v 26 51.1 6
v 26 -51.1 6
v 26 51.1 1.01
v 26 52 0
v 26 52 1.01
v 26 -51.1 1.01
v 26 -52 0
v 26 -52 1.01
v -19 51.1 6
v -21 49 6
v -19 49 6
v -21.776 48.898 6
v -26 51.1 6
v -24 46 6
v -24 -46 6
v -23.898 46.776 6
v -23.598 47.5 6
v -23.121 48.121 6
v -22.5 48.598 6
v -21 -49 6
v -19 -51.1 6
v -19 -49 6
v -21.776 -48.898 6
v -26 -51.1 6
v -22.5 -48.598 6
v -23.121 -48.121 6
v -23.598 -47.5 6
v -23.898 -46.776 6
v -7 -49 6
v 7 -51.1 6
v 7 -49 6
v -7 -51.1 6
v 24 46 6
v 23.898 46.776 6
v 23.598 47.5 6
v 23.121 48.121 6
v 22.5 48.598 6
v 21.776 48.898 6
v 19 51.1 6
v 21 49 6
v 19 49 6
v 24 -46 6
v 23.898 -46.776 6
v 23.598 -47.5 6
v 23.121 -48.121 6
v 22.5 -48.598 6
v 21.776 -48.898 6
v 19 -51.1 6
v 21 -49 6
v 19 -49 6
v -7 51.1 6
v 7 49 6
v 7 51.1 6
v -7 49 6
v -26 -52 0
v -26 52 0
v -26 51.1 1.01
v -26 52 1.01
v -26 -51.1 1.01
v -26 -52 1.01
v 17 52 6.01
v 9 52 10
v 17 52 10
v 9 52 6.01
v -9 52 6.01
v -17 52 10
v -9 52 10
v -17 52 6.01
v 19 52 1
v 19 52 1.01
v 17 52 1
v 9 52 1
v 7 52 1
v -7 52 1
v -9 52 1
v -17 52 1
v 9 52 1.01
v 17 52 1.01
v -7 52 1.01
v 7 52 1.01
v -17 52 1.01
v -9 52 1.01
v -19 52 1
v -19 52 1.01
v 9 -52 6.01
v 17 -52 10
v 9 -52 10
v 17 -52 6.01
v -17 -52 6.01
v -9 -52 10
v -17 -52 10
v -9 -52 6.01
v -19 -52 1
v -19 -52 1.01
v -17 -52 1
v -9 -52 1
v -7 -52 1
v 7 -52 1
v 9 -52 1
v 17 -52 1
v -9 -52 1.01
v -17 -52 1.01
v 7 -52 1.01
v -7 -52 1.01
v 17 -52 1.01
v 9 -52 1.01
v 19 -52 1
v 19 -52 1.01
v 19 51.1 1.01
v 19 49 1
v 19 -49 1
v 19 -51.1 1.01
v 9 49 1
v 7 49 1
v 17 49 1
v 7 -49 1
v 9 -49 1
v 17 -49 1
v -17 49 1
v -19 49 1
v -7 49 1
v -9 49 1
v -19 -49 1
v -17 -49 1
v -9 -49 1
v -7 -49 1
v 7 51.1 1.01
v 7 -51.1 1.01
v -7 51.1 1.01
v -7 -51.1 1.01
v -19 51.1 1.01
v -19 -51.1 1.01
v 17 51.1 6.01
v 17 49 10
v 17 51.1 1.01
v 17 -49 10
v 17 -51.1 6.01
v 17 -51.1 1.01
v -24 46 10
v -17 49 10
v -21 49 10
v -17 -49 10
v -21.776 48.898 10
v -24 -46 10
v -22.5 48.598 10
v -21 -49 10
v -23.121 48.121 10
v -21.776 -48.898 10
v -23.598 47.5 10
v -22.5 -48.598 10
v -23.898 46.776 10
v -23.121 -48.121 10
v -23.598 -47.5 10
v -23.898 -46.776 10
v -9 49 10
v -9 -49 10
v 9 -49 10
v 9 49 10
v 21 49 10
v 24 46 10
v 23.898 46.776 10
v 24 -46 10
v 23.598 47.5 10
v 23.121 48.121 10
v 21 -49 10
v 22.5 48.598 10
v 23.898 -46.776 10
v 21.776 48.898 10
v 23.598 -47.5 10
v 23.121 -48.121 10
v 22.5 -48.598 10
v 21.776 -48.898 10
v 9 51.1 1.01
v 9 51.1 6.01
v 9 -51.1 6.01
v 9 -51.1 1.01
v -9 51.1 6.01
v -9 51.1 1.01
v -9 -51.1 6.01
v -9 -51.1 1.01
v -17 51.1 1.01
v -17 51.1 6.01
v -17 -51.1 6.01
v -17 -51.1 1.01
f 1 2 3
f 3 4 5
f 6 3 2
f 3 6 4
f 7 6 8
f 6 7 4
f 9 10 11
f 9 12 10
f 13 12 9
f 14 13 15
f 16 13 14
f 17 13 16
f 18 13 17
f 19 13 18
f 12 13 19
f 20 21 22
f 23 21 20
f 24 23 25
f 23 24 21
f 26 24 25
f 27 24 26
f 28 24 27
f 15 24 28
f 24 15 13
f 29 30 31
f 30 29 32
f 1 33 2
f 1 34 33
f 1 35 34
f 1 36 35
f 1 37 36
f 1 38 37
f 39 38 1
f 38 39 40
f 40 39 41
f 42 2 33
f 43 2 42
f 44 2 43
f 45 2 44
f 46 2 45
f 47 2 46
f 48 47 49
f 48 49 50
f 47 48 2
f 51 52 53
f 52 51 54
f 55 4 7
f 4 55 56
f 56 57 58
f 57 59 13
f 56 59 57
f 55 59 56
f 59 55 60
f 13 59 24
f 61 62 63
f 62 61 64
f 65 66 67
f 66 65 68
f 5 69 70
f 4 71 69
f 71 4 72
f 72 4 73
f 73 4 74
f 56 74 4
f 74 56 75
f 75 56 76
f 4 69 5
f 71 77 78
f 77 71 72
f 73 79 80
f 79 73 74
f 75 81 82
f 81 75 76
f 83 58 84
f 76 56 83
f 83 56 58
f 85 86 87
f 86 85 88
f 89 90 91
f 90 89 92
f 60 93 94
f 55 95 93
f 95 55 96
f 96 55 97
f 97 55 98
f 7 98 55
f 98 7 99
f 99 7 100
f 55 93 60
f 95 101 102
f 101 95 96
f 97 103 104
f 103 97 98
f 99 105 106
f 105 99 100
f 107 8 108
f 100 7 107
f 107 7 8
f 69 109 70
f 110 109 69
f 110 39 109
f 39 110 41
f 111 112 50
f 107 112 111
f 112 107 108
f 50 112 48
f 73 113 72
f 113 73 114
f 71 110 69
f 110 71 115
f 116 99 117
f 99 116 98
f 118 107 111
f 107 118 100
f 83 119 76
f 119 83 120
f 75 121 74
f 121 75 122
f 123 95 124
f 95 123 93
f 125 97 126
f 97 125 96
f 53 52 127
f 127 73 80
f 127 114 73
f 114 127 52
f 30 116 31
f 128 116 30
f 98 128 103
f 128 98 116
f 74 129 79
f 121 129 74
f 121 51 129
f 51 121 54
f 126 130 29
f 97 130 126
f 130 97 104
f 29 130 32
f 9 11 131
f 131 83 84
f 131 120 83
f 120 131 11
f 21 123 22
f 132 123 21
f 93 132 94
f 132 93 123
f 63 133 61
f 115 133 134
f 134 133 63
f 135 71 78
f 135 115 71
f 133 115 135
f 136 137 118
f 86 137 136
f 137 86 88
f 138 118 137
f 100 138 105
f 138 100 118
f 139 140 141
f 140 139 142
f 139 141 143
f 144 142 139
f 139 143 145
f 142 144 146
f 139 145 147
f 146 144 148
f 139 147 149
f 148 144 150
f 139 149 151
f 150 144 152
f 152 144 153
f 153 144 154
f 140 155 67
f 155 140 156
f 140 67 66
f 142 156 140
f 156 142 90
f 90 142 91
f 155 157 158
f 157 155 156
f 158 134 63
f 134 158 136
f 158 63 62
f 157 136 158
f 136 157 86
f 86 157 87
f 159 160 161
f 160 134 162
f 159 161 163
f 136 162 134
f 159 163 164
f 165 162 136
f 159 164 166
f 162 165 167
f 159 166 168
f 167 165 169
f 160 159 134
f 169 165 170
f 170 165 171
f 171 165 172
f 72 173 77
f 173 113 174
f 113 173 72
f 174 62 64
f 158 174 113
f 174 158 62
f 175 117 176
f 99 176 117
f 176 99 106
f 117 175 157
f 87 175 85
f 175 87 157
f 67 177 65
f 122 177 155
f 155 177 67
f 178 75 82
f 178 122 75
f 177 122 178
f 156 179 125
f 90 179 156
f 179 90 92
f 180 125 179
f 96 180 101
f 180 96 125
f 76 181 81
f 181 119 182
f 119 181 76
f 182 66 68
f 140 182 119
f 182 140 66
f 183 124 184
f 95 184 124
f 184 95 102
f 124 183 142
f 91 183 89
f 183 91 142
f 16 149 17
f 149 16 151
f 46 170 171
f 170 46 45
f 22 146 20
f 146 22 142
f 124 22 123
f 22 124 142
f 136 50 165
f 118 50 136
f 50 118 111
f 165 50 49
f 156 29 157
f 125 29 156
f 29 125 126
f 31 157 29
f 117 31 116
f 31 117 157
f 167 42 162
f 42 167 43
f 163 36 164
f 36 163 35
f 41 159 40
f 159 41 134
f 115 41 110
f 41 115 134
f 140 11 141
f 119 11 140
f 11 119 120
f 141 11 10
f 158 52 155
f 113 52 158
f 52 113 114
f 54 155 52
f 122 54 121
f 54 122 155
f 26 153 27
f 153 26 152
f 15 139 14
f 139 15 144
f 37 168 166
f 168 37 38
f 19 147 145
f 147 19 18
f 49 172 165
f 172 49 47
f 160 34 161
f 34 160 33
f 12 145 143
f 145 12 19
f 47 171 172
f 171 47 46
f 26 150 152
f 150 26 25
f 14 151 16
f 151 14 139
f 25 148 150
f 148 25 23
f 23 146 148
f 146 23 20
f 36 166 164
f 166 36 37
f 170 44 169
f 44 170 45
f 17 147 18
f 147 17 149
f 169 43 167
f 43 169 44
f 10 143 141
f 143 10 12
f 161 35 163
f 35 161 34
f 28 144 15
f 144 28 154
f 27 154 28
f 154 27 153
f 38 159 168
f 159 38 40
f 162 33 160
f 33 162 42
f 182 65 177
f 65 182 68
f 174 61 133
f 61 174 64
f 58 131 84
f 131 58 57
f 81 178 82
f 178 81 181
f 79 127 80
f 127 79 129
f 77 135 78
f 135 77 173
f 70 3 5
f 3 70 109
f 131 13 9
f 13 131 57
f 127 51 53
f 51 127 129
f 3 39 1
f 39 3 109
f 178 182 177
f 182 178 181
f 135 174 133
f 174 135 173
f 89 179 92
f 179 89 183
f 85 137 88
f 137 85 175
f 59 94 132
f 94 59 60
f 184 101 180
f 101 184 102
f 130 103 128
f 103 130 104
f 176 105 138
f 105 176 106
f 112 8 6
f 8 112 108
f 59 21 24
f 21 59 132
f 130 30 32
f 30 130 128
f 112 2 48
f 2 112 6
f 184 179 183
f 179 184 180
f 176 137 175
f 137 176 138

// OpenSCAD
// file: ../OpenSCAD_Modules/cube_vround.scad
module cube_vround(
	size=[10,10,10],
	round_corners=[true,true,true,true],
	rounding=3,
	center_xy=false,
	center_z=false,
	attach=0,
	wall_attach=0,
	quality=2, //integer from 1 to infinity
)
{
	assert(len(size)==3);
	assert(len(round_corners)==4);
	assert(rounding>0);
	assert(rounding<=size[0]/2);
	assert(rounding<=size[1]/2);
	assert(quality>0);
	assert(attach>=0);
	assert(wall_attach>=0);
	height=size[2]+attach;
	cyl_r=rounding+wall_attach;
	cyl_mvx=size[0]/2-rounding;
	cyl_mvy=size[1]/2-rounding;
	cube_szx=size[0]/2;
	cube_szy=size[1]/2;
	cube_mvx=cube_szx/2+wall_attach;
	cube_mvy=cube_szy/2+wall_attach;
	translate([center_xy?0:cube_szx,center_xy?0:cube_szy,center_z?-attach/2:(size[2]-attach)/2])
		hull()
		{
			if(round_corners[0])
				translate([cyl_mvx,cyl_mvy])
					cylinder(r=cyl_r,h=height,$fn=12*quality,center=true);
			else
				translate([cube_mvx,cube_mvy])
					cube([cube_szx,cube_szy,height],center=true);
			if(round_corners[1])
				translate([cyl_mvx,-cyl_mvy])
					cylinder(r=cyl_r,h=height,$fn=12*quality,center=true);
			else
				translate([cube_mvx,-cube_mvy])
					cube([cube_szx,cube_szy,height],center=true);
			if(round_corners[2])
				translate([-cyl_mvx,-cyl_mvy])
					cylinder(r=cyl_r,h=height,$fn=12*quality,center=true);
			else
				translate([-cube_mvx,-cube_mvy])
					cube([cube_szx,cube_szy,height],center=true);
			if(round_corners[3])
				translate([-cyl_mvx,cyl_mvy])
					cylinder(r=cyl_r,h=height,$fn=12*quality,center=true);
			else
				translate([-cube_mvx,cube_mvy])
					cube([cube_szx,cube_szy,height],center=true);
		};
}

//example
cube_vround(round_corners=[true,false,true,false],
size=[10,20,6],
attach=0.1,
wall_attach=0.1,
rounding=3,
center_xy=true,center_z=false);
// main file
use <../OpenSCAD_Modules/cube_vround.scad>

module double_cover(
	quality=2, //integer from 1 to infinity
)
{
	main_height=6;
	base_hieght=1;
	clip_cut=12;
	clip_width=8;
	clip_height=10;
	clip_int_height=7;
	size_int_height=5;
	size_int_depth=1;
	difference()
	{
		union()
		{
			//base
			difference()
			{
				translate([0,0,main_height/2])
					cube([52,104,main_height],center=true);
				translate([52/4,0,main_height/2+base_hieght])
					cube([clip_cut,104+0.1,main_height],center=true);
				translate([-52/4,0,main_height/2+base_hieght])
					cube([clip_cut,104+0.1,main_height],center=true);
			}
			translate([52/4,0,clip_height/2])
				cube([clip_width,104,clip_height],center=true);
			translate([-52/4,0,clip_height/2])
				cube([clip_width,104,clip_height],center=true);
		}
		translate([0,0,base_hieght])
			cube_vround(size=[48,98,clip_height],center_xy=true,quality=quality);
		translate([0,104/2-size_int_depth/2+0.1,base_hieght+size_int_height/2+0.01])
			cube(size=[52+1,size_int_depth,size_int_height],center=true);
		translate([0,-(104/2-size_int_depth/2+0.1),base_hieght+size_int_height/2+0.01])
			cube(size=[52+1,size_int_depth,size_int_height],center=true);
	}
}

module double_cover_cut(
	quality=2, //integer from 1 to infinity
)
{
	base_hieght=1;
	clip_height=10;
	cube_vround(size=[48,98,clip_height],center_xy=true,quality=quality);
}

double_cover_cut();
double_cover();
